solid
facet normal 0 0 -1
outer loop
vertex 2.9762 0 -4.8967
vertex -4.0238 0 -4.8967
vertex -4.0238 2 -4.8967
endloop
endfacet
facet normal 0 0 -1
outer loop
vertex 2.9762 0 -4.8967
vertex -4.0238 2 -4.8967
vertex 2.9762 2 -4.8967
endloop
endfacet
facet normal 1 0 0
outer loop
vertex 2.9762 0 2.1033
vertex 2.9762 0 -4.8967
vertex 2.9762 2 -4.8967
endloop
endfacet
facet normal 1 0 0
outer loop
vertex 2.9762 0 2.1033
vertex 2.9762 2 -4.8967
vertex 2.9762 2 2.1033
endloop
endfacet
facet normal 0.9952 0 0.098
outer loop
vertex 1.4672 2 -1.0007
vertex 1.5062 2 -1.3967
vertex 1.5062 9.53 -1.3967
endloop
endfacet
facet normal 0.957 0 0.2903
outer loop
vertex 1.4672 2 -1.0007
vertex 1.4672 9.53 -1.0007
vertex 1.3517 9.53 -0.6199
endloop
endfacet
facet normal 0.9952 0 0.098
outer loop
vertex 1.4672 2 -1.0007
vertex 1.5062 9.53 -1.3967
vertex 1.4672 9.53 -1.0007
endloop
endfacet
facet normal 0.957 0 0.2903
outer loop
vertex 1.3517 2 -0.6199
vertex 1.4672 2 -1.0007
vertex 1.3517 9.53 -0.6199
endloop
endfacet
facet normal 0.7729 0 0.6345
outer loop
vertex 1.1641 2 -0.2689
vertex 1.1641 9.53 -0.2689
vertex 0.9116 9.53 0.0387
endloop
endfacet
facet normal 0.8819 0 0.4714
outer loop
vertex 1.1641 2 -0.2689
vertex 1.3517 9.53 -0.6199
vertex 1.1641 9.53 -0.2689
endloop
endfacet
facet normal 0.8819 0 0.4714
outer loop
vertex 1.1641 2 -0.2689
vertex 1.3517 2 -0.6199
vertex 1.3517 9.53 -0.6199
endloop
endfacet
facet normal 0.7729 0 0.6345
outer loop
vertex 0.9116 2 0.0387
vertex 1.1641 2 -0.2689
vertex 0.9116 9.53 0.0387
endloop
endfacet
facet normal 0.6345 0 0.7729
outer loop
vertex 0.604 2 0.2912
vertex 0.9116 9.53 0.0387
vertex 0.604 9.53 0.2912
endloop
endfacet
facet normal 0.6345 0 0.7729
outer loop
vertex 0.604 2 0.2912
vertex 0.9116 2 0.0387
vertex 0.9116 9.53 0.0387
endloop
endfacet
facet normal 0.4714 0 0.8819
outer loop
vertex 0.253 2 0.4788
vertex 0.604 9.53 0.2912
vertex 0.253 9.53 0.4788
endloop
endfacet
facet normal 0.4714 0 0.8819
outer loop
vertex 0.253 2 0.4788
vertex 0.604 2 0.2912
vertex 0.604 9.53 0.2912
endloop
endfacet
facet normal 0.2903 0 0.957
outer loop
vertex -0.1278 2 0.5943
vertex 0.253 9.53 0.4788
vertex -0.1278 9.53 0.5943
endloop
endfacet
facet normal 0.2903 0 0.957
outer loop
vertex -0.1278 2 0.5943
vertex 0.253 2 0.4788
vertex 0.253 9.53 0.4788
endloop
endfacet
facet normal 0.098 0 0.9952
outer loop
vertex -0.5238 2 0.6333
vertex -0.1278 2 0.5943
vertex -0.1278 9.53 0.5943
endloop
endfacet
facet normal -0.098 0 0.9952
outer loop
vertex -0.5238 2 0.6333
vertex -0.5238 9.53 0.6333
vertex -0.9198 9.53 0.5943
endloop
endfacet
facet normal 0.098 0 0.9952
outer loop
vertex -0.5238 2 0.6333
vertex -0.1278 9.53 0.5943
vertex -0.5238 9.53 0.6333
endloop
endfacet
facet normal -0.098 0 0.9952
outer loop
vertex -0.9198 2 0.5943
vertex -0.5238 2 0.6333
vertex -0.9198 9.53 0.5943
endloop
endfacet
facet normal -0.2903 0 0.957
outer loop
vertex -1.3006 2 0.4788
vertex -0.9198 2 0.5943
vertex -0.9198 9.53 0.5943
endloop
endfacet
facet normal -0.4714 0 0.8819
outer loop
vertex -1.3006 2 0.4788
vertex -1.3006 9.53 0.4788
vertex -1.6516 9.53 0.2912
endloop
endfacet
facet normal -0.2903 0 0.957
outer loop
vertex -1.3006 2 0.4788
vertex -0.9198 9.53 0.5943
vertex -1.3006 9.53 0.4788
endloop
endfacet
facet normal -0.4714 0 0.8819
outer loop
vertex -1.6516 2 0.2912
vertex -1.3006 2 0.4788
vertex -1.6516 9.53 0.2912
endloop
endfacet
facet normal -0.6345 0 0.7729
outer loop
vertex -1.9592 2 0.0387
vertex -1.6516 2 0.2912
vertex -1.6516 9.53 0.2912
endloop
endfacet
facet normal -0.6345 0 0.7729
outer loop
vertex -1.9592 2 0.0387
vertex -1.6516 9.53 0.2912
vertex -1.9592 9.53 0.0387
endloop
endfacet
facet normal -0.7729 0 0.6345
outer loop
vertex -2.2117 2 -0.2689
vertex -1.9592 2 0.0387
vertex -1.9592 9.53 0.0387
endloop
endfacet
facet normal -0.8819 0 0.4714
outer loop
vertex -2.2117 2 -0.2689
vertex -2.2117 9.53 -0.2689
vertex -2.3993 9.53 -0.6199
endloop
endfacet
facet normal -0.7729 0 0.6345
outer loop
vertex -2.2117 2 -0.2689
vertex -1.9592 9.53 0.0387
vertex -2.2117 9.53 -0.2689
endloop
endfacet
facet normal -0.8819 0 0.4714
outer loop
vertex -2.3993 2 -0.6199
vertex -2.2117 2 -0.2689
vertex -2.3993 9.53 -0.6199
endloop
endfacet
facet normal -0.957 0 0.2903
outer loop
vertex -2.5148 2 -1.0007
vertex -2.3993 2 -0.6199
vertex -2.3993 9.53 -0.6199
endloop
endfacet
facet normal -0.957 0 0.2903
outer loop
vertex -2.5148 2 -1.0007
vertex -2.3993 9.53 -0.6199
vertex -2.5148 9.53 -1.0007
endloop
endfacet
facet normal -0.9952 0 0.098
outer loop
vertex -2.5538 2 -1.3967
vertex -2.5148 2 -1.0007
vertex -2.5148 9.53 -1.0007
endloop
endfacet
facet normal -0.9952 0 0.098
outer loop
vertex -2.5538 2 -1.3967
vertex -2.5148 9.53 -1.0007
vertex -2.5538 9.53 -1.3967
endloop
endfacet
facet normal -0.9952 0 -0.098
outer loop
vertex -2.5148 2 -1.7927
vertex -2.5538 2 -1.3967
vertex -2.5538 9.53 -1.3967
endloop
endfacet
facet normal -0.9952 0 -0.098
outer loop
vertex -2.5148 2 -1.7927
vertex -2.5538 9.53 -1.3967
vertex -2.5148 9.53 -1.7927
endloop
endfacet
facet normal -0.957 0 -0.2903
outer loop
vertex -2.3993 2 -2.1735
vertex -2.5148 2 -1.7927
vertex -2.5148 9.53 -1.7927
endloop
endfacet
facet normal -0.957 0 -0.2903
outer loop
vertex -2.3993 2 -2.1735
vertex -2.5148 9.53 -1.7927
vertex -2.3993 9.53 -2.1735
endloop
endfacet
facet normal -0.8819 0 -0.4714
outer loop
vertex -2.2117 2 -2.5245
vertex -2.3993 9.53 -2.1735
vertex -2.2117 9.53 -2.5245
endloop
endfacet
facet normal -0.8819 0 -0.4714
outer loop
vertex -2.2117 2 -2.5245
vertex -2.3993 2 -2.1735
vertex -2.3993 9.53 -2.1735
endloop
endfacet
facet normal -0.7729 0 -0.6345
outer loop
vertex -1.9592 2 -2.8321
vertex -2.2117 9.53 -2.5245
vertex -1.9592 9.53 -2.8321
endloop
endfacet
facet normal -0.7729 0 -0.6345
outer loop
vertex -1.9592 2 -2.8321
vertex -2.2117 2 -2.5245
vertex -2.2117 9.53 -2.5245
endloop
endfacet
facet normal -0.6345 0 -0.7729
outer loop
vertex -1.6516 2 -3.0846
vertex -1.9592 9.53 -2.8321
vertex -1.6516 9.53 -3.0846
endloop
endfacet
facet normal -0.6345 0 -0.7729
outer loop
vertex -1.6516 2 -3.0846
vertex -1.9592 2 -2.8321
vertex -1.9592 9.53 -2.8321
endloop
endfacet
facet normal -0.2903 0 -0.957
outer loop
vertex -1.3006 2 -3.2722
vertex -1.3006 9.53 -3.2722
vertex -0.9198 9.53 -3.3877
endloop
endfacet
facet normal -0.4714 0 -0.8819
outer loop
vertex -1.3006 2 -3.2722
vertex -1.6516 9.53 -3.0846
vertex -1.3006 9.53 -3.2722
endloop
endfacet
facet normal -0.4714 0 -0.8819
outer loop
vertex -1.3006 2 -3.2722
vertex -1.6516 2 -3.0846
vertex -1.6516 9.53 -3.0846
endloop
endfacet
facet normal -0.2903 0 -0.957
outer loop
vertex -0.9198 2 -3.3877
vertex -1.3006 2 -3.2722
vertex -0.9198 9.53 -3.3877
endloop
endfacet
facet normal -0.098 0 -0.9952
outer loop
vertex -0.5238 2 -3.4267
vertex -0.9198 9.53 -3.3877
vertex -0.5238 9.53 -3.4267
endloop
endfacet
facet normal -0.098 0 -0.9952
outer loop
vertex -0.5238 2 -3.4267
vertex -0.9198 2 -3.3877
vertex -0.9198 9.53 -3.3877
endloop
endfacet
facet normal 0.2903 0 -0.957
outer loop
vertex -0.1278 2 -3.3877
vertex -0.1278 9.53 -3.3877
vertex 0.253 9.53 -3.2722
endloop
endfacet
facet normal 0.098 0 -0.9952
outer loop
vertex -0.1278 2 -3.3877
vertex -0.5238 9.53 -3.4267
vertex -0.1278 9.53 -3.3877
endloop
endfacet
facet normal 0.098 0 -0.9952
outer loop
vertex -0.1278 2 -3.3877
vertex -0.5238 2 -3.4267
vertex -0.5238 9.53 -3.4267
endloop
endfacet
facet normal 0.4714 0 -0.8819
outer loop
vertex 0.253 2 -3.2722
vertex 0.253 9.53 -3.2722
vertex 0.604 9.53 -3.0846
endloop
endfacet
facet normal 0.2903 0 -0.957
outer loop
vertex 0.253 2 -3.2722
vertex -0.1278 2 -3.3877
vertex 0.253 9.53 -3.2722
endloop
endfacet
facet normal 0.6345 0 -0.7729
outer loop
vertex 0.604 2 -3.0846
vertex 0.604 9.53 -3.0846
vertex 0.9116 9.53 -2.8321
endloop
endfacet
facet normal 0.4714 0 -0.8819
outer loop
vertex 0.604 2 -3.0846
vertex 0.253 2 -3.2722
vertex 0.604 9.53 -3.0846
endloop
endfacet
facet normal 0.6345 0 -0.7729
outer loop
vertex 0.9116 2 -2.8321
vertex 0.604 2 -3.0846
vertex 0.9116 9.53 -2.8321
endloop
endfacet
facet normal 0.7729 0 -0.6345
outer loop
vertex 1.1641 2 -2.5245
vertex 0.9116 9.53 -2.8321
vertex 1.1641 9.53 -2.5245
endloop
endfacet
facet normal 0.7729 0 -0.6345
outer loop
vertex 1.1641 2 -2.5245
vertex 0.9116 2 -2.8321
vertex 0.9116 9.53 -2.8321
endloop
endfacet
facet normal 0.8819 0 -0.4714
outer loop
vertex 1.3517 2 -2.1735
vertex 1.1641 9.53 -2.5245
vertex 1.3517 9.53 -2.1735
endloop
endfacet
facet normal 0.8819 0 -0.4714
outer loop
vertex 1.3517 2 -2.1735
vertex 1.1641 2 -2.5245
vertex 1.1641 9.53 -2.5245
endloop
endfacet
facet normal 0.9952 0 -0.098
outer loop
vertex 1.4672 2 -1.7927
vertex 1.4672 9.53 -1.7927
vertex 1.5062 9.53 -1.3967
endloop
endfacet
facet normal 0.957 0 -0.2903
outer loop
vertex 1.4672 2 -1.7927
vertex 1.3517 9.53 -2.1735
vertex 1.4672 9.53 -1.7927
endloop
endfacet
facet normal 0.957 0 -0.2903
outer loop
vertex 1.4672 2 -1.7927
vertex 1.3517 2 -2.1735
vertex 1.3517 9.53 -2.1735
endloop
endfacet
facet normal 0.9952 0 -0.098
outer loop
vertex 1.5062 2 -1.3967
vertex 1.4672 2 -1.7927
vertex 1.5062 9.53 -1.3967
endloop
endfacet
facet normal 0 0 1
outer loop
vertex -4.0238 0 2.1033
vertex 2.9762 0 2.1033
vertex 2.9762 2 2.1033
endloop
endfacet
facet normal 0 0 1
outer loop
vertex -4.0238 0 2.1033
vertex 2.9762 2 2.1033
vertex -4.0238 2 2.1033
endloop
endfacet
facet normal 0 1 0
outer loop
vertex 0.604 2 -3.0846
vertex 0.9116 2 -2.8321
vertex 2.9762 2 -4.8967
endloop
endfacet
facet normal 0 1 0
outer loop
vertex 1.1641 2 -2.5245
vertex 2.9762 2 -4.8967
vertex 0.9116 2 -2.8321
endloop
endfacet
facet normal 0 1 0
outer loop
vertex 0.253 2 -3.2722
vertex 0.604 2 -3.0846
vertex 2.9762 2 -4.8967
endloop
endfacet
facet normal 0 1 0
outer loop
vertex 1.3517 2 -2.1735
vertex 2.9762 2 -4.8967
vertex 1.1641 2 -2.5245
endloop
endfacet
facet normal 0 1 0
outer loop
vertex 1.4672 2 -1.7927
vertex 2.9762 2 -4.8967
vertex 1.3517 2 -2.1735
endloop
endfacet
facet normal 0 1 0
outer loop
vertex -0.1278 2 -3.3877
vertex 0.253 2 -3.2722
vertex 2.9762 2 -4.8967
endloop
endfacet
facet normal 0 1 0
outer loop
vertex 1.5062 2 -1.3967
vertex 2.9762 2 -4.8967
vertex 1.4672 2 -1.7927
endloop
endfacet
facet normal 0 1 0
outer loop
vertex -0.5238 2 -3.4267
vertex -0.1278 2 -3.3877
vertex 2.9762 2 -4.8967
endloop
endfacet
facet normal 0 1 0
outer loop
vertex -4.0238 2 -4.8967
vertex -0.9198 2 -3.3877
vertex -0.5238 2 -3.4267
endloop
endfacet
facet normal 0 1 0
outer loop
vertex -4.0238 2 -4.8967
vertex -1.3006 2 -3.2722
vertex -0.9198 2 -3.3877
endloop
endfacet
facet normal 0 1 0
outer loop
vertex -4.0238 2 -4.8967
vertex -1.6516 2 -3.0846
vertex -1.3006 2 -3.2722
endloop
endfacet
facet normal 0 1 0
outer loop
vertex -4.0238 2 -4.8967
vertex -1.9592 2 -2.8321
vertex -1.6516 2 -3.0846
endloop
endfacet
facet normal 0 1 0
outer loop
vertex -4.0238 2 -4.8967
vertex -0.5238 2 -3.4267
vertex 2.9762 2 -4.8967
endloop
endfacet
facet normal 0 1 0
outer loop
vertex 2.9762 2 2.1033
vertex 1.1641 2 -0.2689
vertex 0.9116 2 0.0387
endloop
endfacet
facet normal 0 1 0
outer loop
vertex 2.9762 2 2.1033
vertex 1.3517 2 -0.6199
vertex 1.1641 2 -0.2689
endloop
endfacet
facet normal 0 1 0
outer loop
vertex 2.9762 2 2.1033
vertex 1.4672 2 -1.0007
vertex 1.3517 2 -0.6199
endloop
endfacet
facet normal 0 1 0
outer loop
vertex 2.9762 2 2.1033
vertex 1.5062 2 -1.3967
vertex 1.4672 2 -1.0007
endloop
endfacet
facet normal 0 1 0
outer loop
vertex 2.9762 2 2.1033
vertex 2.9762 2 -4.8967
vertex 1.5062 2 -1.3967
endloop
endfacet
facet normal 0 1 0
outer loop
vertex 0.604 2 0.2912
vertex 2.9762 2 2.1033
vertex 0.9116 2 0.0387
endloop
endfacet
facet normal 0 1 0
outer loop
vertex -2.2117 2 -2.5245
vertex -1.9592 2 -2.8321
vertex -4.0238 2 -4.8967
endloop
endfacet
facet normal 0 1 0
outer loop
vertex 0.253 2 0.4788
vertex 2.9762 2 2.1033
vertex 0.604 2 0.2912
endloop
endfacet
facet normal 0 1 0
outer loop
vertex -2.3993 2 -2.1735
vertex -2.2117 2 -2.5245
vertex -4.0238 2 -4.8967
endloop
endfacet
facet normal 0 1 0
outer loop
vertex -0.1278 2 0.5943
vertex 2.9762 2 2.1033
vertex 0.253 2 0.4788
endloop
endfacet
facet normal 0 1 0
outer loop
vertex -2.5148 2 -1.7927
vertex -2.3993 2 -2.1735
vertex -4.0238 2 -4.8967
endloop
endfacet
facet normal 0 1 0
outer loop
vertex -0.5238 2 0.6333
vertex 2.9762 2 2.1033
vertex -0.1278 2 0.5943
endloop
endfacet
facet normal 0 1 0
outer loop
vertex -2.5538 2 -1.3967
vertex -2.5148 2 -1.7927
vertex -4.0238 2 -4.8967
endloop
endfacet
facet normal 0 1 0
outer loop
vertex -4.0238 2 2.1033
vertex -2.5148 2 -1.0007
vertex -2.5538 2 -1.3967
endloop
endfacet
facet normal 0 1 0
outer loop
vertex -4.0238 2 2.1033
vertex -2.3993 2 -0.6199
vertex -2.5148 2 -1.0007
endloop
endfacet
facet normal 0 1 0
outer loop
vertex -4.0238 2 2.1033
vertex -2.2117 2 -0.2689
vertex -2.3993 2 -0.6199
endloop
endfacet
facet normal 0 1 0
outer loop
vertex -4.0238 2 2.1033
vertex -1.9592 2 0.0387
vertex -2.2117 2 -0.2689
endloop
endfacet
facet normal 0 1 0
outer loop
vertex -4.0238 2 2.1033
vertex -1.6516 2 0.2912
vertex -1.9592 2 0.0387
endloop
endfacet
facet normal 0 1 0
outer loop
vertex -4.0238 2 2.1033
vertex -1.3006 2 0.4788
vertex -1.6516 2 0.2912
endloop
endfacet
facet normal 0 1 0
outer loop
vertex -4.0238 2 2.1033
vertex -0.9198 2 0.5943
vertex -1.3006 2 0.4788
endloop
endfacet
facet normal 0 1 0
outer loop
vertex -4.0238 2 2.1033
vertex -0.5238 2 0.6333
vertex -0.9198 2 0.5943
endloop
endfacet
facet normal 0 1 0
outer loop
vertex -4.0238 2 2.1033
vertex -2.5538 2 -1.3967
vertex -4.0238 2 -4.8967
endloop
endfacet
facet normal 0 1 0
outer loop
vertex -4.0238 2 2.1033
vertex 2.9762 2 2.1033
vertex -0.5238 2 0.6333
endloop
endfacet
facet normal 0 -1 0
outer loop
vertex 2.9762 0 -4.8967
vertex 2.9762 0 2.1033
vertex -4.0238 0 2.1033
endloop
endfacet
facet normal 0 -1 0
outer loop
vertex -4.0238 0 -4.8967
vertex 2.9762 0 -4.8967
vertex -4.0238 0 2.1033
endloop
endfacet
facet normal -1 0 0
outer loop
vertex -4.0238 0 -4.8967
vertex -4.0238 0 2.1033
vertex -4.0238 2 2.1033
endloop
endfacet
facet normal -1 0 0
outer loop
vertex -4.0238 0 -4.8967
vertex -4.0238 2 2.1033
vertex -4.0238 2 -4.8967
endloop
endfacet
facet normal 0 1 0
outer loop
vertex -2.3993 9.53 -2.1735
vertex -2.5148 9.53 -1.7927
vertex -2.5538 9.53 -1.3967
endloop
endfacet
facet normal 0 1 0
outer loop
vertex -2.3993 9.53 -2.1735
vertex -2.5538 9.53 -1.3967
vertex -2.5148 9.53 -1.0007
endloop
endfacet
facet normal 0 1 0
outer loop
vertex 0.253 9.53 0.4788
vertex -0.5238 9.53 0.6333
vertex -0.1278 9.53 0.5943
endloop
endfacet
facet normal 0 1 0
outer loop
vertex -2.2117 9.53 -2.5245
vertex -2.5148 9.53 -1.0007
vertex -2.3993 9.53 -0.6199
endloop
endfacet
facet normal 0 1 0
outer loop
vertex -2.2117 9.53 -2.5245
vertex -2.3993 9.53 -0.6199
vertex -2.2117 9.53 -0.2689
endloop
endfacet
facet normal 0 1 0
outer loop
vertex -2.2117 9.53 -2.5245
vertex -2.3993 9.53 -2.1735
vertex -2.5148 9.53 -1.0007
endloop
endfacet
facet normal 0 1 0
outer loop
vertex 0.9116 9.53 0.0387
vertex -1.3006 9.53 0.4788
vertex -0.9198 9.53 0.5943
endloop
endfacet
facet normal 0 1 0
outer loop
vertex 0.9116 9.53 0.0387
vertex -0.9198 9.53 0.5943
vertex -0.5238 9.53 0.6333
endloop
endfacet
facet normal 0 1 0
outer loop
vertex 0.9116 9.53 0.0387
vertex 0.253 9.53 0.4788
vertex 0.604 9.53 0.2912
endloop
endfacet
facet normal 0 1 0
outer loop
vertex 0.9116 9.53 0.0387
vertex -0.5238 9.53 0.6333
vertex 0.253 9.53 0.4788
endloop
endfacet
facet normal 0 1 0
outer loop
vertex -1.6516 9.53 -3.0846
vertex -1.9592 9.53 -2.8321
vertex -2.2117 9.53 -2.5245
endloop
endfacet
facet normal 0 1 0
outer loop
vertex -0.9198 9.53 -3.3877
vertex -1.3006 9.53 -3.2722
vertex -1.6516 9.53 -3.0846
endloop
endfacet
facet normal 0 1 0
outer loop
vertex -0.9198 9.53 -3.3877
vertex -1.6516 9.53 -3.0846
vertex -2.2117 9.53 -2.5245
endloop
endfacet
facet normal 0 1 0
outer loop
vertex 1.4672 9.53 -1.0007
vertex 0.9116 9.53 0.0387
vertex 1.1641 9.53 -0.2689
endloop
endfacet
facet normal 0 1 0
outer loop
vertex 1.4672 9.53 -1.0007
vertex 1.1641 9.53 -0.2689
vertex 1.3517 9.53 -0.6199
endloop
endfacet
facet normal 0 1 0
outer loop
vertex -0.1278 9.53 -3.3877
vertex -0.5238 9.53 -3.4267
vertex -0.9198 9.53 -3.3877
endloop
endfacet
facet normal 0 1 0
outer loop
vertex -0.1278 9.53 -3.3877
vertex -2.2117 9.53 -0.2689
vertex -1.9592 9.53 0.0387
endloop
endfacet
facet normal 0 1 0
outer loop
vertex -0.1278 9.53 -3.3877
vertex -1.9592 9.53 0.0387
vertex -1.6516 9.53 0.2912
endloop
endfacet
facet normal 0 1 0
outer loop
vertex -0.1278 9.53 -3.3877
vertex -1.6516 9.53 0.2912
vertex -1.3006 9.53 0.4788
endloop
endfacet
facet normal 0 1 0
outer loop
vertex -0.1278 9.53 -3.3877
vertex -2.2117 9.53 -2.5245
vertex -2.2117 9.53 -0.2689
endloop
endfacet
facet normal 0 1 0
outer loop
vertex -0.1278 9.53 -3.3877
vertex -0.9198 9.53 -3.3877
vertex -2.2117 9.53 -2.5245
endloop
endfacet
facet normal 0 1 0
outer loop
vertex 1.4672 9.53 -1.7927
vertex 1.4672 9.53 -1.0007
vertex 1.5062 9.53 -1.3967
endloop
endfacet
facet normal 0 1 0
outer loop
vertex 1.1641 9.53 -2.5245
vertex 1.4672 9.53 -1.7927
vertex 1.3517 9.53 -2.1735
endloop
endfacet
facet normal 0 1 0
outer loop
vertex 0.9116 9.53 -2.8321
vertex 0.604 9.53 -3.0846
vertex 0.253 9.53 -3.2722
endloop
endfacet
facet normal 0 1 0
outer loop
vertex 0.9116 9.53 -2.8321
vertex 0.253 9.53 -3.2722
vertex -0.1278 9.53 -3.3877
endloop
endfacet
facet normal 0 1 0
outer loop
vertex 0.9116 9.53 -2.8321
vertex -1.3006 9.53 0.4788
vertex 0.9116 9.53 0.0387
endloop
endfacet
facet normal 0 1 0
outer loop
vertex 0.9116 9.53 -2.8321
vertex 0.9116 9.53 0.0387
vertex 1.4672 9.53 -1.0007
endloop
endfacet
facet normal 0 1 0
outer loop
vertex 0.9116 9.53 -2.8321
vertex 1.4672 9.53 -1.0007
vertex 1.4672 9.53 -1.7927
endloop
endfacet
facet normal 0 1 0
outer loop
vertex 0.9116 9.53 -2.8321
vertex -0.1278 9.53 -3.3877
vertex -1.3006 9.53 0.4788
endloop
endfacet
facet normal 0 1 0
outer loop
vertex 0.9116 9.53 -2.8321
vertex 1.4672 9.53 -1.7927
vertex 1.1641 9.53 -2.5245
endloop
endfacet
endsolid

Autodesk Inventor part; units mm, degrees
ref_plane "YZ Plane" through (0, 0, 0) normal (1, 0, 0) x (0, 1, 0)
ref_plane "XZ Plane" through (0, 0, 0) normal (0, 1, 0) x (-1, 0, 0)
ref_plane "XY Plane" through (0, 0, 0) normal (0, 0, 1) x (1, 0, 0)
sketch "Sketch1" plane through (0, 0, 0) normal (0, 1, 0) x (-1, 0, 0)
  line L0 (-2.9762, 2.1033) -> (4.0238, 2.1033)
  line L1 (4.0238, 2.1033) -> (4.0238, -4.8967)
  line L2 (4.0238, -4.8967) -> (-2.9762, -4.8967)
  line L3 (-2.9762, -4.8967) -> (-2.9762, 2.1033)
  point P0 (0, 0)
  dimension "d0" = 7
  dimension "d1" = 7
extrude "Extrusion1" add sketch "Sketch1" along normal blind 2
sketch "Sketch2" plane through (0, 2, 0) normal (0, 1, 0) x (1, 0, 0)
  circle A0 centre (-0.5238, 1.3967) radius 2.03
  point P0 (0, 0)
  dimension "d4" = 4.06
extrude "Extrusion2" add sketch "Sketch2" along normal blind 7.53
properties part number "SMA_Up"
